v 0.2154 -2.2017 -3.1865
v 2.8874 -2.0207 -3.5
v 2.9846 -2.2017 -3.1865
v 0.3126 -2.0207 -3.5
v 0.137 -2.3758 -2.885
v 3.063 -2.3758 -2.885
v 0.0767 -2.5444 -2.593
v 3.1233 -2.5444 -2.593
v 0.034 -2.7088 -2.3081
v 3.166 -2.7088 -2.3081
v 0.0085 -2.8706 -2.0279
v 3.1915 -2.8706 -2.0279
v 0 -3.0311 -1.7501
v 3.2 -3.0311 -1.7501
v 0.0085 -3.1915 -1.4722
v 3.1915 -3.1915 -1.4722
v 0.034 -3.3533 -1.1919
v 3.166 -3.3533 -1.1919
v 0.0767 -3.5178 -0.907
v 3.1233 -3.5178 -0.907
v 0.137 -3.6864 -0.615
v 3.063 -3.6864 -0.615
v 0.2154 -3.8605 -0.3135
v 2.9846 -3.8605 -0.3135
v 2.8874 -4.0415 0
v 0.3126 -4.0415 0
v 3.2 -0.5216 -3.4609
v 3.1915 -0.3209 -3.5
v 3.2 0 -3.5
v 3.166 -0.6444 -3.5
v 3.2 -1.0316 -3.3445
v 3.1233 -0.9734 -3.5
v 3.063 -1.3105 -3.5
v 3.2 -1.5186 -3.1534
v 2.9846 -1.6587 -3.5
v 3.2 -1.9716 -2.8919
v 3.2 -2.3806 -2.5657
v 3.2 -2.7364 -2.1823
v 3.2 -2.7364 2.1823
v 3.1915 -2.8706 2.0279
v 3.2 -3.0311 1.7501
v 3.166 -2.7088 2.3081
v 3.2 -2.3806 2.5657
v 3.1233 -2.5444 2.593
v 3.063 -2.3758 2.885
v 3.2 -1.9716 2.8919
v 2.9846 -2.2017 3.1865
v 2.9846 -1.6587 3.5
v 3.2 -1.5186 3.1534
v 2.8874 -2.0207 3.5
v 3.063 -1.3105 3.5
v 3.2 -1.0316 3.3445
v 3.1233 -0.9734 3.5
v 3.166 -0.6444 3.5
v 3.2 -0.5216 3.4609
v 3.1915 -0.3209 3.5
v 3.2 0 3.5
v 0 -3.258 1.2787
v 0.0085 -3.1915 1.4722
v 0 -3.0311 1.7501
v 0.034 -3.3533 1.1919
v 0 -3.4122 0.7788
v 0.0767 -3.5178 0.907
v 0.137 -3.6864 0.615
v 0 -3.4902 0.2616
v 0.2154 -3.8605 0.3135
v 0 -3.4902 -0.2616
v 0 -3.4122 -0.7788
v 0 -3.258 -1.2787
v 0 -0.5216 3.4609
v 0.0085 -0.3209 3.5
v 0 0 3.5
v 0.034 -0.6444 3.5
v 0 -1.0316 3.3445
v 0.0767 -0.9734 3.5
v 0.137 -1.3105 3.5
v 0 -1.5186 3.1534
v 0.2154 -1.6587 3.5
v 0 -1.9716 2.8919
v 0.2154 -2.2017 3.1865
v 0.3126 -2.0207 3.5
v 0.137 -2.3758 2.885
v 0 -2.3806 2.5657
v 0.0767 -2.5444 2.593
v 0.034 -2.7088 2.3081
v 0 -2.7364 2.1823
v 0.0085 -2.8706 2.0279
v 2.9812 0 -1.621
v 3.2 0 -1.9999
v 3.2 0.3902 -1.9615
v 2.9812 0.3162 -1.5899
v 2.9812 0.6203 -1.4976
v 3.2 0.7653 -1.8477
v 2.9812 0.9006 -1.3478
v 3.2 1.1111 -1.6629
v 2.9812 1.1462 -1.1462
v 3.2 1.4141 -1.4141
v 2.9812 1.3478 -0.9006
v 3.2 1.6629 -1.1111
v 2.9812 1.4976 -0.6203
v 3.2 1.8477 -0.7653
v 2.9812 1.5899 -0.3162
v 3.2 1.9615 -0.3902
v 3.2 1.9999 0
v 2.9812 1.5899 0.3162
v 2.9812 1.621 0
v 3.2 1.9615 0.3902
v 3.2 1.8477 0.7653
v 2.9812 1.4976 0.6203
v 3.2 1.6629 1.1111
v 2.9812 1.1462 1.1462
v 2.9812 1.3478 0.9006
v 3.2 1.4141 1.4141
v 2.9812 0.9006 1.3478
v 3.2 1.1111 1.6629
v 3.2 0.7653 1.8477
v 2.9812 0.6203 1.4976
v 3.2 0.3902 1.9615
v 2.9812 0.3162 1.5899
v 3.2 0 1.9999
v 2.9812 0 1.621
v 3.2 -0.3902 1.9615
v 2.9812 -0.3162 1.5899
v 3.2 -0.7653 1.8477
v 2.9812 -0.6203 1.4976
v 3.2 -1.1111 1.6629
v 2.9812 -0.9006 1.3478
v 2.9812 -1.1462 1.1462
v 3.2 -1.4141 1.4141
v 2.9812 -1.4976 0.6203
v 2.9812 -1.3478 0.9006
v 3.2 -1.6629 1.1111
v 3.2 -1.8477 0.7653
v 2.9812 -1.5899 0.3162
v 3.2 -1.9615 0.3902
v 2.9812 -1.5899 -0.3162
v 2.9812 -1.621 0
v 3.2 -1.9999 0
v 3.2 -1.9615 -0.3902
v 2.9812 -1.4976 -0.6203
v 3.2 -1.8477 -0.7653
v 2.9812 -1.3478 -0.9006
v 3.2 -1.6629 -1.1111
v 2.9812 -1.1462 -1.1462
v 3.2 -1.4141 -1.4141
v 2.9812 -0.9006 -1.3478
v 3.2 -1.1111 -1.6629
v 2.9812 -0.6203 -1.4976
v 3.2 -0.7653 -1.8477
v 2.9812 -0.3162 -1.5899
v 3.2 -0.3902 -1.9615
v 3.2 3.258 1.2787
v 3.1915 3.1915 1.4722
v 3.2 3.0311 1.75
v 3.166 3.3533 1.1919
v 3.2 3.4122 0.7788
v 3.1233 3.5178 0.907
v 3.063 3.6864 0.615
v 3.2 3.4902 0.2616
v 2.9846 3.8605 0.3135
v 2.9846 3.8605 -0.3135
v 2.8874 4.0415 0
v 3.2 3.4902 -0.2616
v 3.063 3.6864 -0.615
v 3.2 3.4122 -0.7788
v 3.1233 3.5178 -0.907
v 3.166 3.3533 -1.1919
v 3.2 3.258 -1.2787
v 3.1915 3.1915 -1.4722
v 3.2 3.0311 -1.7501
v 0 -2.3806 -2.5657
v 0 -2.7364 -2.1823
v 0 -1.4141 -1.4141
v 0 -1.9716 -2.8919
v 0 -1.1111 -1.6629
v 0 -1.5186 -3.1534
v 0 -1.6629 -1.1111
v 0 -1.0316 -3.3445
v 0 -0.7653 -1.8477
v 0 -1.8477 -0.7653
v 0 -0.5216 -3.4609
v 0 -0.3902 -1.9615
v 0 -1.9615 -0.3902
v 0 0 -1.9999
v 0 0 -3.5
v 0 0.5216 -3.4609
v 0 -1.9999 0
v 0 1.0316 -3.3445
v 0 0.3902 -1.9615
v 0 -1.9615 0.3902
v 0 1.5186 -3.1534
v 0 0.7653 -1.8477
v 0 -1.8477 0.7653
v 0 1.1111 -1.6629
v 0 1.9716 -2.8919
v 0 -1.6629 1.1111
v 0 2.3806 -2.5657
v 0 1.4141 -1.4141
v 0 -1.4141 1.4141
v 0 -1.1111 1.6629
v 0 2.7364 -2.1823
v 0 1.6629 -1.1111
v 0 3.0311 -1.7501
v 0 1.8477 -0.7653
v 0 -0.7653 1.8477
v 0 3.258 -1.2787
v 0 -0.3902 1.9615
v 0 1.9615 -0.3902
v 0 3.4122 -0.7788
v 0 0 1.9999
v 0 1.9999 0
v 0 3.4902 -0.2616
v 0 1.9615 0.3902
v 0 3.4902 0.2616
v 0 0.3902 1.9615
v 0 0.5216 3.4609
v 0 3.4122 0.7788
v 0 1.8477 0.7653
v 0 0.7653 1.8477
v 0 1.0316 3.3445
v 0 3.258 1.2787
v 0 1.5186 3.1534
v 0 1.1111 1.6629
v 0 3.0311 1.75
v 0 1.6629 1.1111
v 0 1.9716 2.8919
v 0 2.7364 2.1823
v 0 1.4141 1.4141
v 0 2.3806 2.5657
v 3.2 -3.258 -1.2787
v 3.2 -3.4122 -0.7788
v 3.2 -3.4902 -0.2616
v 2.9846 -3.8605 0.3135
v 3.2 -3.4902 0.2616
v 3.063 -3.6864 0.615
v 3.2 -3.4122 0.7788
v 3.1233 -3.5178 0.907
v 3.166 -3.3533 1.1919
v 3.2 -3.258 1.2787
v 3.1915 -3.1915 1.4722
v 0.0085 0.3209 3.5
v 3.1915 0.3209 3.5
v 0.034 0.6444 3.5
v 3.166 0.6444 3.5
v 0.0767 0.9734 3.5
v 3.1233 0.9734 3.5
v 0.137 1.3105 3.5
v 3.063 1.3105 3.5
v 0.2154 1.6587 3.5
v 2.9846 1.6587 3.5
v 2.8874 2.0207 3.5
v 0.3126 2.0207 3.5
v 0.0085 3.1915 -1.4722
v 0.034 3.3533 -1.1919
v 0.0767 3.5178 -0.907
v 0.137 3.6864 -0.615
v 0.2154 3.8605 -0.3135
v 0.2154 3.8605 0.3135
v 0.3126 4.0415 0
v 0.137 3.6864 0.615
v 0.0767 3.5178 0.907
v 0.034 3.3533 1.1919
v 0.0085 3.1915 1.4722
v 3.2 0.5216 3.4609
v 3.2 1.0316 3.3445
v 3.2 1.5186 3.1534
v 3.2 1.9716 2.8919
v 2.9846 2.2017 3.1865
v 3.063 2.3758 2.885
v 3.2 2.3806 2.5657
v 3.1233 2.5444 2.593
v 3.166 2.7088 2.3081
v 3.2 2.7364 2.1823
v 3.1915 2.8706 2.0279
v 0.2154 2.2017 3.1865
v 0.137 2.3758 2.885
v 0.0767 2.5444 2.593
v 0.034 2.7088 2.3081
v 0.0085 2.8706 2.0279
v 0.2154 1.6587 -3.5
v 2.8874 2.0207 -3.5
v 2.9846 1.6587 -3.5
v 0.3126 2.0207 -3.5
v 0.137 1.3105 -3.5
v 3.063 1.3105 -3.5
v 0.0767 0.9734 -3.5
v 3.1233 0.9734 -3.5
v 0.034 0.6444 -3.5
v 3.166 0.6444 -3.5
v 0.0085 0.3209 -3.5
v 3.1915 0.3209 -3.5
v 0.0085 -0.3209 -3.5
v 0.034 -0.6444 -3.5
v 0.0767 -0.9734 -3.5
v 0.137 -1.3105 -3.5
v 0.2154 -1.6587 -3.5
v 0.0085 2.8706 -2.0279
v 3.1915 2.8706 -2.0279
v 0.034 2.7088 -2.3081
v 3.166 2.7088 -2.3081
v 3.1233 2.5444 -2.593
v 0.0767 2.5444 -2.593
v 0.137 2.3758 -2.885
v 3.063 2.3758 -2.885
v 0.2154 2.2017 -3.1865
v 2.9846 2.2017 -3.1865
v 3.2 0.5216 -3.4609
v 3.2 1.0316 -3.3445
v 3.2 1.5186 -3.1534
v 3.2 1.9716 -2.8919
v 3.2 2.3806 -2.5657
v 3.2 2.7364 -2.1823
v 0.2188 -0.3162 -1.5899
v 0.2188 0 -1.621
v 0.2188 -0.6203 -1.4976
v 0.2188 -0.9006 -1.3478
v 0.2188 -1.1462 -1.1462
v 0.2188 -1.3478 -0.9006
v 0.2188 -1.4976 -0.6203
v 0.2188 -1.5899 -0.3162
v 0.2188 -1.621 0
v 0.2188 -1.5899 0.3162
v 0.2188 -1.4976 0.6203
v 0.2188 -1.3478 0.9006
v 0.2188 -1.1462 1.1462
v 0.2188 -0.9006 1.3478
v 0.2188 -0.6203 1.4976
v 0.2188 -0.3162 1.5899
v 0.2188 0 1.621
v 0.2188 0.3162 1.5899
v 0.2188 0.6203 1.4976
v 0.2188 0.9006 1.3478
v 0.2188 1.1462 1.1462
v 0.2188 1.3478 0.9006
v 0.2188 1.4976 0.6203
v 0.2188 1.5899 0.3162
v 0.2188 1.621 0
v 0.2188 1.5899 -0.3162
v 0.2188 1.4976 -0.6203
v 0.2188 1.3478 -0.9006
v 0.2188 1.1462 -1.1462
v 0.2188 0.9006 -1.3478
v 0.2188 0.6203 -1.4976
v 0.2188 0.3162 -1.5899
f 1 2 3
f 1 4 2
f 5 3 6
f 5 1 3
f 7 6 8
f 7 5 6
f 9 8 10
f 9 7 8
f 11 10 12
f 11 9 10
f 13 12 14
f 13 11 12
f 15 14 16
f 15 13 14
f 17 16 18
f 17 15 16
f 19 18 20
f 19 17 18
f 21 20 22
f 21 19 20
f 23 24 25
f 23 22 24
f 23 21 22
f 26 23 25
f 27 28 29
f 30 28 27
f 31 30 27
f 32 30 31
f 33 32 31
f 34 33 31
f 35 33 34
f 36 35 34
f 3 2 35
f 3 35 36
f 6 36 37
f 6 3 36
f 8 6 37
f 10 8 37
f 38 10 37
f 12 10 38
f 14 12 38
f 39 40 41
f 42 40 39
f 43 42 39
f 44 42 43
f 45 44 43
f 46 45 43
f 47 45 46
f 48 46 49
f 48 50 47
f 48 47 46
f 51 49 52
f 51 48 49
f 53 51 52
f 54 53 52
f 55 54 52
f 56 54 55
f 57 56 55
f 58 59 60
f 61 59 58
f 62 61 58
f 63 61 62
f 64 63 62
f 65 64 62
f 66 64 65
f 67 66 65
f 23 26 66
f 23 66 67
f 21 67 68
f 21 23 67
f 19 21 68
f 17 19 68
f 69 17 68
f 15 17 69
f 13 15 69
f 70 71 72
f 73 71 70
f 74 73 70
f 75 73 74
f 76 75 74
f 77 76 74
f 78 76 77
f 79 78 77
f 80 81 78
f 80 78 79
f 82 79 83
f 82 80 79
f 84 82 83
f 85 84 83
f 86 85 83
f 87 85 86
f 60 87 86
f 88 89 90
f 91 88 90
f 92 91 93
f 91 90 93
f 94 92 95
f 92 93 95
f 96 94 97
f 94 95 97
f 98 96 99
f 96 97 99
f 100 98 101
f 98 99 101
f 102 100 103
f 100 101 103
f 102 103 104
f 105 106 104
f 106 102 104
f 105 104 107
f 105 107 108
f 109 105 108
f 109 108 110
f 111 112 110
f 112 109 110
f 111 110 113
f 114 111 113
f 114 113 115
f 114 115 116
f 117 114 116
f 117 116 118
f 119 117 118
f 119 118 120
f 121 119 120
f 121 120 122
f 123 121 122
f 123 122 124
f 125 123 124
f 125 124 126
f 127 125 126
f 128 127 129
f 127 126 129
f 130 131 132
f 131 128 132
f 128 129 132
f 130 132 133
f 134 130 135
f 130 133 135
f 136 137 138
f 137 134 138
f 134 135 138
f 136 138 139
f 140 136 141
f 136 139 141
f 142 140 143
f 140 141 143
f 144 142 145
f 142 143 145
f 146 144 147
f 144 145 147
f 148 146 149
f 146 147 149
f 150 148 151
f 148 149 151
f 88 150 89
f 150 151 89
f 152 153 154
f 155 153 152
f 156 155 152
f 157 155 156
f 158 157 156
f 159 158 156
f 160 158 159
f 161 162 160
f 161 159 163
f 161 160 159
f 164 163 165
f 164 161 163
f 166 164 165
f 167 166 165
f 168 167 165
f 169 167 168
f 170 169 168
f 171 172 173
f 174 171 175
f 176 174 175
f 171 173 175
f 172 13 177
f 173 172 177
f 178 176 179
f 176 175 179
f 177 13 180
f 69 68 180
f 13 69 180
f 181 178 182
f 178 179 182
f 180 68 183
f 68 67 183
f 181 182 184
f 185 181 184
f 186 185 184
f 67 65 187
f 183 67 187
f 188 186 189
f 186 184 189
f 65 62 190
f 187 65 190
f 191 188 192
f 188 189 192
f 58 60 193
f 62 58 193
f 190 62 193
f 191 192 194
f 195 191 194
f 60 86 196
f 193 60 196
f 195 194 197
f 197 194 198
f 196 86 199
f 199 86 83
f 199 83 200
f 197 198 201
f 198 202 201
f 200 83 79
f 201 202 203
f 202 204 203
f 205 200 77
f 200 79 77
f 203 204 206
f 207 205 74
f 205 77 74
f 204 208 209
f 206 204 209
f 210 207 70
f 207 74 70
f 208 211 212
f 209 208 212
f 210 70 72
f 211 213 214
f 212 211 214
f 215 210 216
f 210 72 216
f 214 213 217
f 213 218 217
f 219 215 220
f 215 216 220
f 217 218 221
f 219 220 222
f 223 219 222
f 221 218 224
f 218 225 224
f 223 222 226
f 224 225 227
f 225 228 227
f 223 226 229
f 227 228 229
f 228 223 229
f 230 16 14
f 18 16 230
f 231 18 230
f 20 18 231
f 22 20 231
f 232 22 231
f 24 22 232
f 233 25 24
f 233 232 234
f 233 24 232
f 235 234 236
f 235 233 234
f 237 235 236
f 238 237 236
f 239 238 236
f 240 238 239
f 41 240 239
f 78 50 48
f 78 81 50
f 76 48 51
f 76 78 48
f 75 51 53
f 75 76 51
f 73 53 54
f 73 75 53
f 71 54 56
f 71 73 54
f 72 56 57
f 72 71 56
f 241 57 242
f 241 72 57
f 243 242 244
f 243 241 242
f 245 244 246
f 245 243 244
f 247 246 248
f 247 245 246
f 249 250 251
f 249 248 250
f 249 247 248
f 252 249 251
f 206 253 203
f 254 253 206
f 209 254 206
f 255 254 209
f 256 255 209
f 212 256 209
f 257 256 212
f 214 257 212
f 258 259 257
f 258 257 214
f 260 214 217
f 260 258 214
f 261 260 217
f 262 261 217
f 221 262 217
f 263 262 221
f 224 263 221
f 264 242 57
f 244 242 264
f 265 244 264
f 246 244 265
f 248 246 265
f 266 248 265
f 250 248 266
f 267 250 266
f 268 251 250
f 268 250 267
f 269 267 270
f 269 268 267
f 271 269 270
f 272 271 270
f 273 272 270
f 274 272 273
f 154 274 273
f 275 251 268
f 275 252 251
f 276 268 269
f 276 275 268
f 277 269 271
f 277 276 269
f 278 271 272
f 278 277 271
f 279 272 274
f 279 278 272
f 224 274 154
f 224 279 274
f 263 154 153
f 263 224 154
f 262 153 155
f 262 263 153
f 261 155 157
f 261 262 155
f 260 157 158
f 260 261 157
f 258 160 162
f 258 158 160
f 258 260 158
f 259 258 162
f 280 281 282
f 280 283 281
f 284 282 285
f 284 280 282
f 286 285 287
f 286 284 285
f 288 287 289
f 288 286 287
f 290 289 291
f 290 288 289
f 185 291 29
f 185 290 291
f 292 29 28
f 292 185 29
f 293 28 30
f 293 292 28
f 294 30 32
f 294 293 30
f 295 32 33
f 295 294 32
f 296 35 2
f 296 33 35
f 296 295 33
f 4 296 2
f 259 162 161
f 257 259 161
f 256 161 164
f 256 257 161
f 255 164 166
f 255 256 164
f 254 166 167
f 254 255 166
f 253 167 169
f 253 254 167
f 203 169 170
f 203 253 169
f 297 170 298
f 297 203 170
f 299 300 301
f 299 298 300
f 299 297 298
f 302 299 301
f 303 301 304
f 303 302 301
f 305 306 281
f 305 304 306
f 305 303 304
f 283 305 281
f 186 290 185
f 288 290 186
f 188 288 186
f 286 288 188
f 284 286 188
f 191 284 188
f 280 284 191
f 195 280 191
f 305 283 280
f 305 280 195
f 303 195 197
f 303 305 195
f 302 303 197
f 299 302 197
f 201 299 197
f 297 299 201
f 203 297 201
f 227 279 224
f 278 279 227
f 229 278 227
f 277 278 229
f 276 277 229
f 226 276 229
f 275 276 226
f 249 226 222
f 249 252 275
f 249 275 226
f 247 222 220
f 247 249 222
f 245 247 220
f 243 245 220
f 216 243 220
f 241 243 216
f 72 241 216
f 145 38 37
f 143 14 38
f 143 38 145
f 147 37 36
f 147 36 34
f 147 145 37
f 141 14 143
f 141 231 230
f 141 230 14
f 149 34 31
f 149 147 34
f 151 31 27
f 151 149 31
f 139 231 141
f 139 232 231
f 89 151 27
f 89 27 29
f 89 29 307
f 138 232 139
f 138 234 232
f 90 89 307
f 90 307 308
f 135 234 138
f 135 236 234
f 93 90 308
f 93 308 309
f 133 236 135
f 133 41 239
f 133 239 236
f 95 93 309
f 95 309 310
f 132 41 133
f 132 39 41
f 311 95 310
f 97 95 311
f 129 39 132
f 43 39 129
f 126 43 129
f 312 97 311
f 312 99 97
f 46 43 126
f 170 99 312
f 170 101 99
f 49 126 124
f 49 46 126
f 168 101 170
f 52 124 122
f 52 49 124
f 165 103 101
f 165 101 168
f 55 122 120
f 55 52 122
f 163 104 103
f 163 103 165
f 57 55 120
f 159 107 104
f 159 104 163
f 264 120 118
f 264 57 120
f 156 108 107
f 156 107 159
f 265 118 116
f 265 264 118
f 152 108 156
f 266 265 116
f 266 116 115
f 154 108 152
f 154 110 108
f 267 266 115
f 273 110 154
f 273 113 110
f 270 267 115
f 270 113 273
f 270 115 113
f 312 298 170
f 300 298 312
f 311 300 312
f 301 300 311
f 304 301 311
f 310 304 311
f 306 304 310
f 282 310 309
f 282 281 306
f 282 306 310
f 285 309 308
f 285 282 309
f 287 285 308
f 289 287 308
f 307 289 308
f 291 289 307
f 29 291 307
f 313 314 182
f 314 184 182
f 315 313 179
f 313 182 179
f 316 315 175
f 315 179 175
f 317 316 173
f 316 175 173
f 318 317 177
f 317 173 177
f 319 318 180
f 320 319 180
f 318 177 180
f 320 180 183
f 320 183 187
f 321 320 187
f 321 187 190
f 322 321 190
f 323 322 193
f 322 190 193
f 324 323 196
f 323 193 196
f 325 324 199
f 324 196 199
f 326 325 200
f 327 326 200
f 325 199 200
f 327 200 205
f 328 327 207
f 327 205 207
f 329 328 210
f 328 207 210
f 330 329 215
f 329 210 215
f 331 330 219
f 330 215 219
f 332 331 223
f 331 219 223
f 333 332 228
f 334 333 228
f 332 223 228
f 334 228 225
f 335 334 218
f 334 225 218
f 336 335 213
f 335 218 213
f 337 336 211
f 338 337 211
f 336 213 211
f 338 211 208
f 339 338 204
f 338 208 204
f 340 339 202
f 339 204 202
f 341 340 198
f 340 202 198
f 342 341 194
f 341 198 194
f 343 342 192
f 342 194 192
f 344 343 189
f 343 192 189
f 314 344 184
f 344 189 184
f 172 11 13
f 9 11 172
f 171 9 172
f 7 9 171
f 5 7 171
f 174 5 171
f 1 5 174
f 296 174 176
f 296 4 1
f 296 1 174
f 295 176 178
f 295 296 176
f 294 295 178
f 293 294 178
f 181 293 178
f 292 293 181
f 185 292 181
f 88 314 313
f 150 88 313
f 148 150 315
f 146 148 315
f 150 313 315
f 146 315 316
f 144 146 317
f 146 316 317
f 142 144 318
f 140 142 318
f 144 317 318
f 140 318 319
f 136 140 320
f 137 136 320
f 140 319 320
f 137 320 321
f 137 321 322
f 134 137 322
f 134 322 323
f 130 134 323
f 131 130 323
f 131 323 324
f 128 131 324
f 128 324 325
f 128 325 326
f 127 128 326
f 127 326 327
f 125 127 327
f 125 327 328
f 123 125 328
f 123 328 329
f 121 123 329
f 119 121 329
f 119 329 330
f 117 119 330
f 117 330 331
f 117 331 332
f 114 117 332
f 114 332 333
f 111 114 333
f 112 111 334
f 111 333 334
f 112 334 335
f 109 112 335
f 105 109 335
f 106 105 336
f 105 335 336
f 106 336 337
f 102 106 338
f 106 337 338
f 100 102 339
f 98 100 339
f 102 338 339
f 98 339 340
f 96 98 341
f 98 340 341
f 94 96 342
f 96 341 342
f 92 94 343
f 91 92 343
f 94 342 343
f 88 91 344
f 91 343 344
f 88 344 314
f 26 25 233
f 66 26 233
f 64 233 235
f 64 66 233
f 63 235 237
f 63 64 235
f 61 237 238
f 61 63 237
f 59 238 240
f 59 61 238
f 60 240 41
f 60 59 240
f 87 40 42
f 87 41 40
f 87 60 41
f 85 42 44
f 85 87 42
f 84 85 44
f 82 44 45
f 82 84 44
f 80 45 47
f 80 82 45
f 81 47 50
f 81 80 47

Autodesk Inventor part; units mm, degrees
ref_plane "YZ Plane" through (0, 0, 0) normal (1, 0, 0) x (0, 1, 0)
ref_plane "XZ Plane" through (0, 0, 0) normal (0, 1, 0) x (-1, 0, 0)
sketch "Boceto1" plane through (0, 0, 0) normal (1, 0, 0) x (0, 1, 0)
  line L0 (-4.0415, 0) -> (-2.0207, 3.5)
  line L1 (-2.0207, 3.5) -> (2.0207, 3.5)
  line L2 (2.0207, 3.5) -> (4.0415, 0)
  line L3 (4.0415, 0) -> (2.0207, -3.5)
  line L4 (2.0207, -3.5) -> (-2.0207, -3.5)
  line L5 (-2.0207, -3.5) -> (-4.0415, 0)
  point P0 (0, 0)
  point P1 (0, 0)
  dimension "d0" = 8.0829
extrude "Cuerpo" add sketch "Boceto1" along normal blind 3.2
sketch "Boceto2" plane through (0, 0, 0) normal (0, 0, 1) x (1, 0, 0)
  line L0 (0, 2.0207) -> (0, 4.0415) projected
  line L1 (0, 4.0415) -> (3.2, 4.0415) projected
  line L2 (3.2, 2.0207) -> (3.2, 4.0415) projected
  line L3 (-0.64, 0) -> (3.84, 0) projected
  line L4 (0.3126, 4.0415) -> (0, 3.5)
  line L5 (2.8874, 4.0415) -> (3.2, 3.5)
  dimension "d3" = 30
  dimension "d4" = 30
  dimension "d5" = 7
  dimension "d6" = 7
revolve "Chaflán1" cut sketch "Boceto2" angle 360 about axis through (-10, 0, 0) along (1, 0, 0)
sketch "Boceto3" plane through (3.2, 0, 0) normal (1, 0, 0) x (0, 0, -1)
  arc A0 (-1.75, -3.0311) -> (1.75, -3.0311) centre (0, 0) ccw projected
hole "Rosca" at (3.2, 0, 0) direction (-1, 0, 0) diameter 3.242 end through all thread size "M4x0.7" class "6H" standard "ISO Metric profile"
chamfer "Chaflán2" distance 0.3789 angle 30 1 edges at (3.2, 0, 1.621) measured on face at (3.2, 2.8569, -0.0651)
chamfer "Chaflán3" distance 0.3789 angle 30 1 edges at (0, 0, 1.621) measured on face at (0, 2.8569, -0.0651)
ref_plane "Work Plane1" through (-7.9612, 0, 0) normal (0, -0.866, -0.5) x (1, 0, 0)
equation "\"d0\" = 1.1547 * SW"
equation "\"d1\" = KOH"
equation "\"d3\" = ANG1"
equation "\"d4\" = ANG2"
equation "\"d5\" = SW0"
equation "\"d6\" = SW01"
equation "\"d8\" = -0.5 * GD1 + 0.5 * NND"
equation "\"d40\" = -0.5 * GD1 + 0.5 * NND"
equation "\"d10\" = -0.5 * GD1 + 0.5 * NND"
equation "\"d41\" = -0.5 * GD1 + 0.5 * NND"
equation "\"ANG1\" = 30deg"
equation "\"ANG2\" = 30deg"
equation "\"NND\" = 4"
equation "\"KOH\" = 3.2"
equation "\"SW\" = 7"
equation "\"SW0\" = SW"
equation "\"SW01\" = SW"
equation "\"GUL\" = 0.541266 * PTC"
equation "\"WFT\" = 0.4"
equation "\"THREADDIA\" = 4"
equation "\"TOA\" = 30deg"
equation "\"PTC\" = 0.7"
equation "\"E0\" = 1.155 * SW"
equation "\"GAL\" = 0.541266 * PTC"
equation "\"GD1\" = 3.242228"
properties part number "AS 1112 - M4  Tipo 5" material "Acero, suave"
